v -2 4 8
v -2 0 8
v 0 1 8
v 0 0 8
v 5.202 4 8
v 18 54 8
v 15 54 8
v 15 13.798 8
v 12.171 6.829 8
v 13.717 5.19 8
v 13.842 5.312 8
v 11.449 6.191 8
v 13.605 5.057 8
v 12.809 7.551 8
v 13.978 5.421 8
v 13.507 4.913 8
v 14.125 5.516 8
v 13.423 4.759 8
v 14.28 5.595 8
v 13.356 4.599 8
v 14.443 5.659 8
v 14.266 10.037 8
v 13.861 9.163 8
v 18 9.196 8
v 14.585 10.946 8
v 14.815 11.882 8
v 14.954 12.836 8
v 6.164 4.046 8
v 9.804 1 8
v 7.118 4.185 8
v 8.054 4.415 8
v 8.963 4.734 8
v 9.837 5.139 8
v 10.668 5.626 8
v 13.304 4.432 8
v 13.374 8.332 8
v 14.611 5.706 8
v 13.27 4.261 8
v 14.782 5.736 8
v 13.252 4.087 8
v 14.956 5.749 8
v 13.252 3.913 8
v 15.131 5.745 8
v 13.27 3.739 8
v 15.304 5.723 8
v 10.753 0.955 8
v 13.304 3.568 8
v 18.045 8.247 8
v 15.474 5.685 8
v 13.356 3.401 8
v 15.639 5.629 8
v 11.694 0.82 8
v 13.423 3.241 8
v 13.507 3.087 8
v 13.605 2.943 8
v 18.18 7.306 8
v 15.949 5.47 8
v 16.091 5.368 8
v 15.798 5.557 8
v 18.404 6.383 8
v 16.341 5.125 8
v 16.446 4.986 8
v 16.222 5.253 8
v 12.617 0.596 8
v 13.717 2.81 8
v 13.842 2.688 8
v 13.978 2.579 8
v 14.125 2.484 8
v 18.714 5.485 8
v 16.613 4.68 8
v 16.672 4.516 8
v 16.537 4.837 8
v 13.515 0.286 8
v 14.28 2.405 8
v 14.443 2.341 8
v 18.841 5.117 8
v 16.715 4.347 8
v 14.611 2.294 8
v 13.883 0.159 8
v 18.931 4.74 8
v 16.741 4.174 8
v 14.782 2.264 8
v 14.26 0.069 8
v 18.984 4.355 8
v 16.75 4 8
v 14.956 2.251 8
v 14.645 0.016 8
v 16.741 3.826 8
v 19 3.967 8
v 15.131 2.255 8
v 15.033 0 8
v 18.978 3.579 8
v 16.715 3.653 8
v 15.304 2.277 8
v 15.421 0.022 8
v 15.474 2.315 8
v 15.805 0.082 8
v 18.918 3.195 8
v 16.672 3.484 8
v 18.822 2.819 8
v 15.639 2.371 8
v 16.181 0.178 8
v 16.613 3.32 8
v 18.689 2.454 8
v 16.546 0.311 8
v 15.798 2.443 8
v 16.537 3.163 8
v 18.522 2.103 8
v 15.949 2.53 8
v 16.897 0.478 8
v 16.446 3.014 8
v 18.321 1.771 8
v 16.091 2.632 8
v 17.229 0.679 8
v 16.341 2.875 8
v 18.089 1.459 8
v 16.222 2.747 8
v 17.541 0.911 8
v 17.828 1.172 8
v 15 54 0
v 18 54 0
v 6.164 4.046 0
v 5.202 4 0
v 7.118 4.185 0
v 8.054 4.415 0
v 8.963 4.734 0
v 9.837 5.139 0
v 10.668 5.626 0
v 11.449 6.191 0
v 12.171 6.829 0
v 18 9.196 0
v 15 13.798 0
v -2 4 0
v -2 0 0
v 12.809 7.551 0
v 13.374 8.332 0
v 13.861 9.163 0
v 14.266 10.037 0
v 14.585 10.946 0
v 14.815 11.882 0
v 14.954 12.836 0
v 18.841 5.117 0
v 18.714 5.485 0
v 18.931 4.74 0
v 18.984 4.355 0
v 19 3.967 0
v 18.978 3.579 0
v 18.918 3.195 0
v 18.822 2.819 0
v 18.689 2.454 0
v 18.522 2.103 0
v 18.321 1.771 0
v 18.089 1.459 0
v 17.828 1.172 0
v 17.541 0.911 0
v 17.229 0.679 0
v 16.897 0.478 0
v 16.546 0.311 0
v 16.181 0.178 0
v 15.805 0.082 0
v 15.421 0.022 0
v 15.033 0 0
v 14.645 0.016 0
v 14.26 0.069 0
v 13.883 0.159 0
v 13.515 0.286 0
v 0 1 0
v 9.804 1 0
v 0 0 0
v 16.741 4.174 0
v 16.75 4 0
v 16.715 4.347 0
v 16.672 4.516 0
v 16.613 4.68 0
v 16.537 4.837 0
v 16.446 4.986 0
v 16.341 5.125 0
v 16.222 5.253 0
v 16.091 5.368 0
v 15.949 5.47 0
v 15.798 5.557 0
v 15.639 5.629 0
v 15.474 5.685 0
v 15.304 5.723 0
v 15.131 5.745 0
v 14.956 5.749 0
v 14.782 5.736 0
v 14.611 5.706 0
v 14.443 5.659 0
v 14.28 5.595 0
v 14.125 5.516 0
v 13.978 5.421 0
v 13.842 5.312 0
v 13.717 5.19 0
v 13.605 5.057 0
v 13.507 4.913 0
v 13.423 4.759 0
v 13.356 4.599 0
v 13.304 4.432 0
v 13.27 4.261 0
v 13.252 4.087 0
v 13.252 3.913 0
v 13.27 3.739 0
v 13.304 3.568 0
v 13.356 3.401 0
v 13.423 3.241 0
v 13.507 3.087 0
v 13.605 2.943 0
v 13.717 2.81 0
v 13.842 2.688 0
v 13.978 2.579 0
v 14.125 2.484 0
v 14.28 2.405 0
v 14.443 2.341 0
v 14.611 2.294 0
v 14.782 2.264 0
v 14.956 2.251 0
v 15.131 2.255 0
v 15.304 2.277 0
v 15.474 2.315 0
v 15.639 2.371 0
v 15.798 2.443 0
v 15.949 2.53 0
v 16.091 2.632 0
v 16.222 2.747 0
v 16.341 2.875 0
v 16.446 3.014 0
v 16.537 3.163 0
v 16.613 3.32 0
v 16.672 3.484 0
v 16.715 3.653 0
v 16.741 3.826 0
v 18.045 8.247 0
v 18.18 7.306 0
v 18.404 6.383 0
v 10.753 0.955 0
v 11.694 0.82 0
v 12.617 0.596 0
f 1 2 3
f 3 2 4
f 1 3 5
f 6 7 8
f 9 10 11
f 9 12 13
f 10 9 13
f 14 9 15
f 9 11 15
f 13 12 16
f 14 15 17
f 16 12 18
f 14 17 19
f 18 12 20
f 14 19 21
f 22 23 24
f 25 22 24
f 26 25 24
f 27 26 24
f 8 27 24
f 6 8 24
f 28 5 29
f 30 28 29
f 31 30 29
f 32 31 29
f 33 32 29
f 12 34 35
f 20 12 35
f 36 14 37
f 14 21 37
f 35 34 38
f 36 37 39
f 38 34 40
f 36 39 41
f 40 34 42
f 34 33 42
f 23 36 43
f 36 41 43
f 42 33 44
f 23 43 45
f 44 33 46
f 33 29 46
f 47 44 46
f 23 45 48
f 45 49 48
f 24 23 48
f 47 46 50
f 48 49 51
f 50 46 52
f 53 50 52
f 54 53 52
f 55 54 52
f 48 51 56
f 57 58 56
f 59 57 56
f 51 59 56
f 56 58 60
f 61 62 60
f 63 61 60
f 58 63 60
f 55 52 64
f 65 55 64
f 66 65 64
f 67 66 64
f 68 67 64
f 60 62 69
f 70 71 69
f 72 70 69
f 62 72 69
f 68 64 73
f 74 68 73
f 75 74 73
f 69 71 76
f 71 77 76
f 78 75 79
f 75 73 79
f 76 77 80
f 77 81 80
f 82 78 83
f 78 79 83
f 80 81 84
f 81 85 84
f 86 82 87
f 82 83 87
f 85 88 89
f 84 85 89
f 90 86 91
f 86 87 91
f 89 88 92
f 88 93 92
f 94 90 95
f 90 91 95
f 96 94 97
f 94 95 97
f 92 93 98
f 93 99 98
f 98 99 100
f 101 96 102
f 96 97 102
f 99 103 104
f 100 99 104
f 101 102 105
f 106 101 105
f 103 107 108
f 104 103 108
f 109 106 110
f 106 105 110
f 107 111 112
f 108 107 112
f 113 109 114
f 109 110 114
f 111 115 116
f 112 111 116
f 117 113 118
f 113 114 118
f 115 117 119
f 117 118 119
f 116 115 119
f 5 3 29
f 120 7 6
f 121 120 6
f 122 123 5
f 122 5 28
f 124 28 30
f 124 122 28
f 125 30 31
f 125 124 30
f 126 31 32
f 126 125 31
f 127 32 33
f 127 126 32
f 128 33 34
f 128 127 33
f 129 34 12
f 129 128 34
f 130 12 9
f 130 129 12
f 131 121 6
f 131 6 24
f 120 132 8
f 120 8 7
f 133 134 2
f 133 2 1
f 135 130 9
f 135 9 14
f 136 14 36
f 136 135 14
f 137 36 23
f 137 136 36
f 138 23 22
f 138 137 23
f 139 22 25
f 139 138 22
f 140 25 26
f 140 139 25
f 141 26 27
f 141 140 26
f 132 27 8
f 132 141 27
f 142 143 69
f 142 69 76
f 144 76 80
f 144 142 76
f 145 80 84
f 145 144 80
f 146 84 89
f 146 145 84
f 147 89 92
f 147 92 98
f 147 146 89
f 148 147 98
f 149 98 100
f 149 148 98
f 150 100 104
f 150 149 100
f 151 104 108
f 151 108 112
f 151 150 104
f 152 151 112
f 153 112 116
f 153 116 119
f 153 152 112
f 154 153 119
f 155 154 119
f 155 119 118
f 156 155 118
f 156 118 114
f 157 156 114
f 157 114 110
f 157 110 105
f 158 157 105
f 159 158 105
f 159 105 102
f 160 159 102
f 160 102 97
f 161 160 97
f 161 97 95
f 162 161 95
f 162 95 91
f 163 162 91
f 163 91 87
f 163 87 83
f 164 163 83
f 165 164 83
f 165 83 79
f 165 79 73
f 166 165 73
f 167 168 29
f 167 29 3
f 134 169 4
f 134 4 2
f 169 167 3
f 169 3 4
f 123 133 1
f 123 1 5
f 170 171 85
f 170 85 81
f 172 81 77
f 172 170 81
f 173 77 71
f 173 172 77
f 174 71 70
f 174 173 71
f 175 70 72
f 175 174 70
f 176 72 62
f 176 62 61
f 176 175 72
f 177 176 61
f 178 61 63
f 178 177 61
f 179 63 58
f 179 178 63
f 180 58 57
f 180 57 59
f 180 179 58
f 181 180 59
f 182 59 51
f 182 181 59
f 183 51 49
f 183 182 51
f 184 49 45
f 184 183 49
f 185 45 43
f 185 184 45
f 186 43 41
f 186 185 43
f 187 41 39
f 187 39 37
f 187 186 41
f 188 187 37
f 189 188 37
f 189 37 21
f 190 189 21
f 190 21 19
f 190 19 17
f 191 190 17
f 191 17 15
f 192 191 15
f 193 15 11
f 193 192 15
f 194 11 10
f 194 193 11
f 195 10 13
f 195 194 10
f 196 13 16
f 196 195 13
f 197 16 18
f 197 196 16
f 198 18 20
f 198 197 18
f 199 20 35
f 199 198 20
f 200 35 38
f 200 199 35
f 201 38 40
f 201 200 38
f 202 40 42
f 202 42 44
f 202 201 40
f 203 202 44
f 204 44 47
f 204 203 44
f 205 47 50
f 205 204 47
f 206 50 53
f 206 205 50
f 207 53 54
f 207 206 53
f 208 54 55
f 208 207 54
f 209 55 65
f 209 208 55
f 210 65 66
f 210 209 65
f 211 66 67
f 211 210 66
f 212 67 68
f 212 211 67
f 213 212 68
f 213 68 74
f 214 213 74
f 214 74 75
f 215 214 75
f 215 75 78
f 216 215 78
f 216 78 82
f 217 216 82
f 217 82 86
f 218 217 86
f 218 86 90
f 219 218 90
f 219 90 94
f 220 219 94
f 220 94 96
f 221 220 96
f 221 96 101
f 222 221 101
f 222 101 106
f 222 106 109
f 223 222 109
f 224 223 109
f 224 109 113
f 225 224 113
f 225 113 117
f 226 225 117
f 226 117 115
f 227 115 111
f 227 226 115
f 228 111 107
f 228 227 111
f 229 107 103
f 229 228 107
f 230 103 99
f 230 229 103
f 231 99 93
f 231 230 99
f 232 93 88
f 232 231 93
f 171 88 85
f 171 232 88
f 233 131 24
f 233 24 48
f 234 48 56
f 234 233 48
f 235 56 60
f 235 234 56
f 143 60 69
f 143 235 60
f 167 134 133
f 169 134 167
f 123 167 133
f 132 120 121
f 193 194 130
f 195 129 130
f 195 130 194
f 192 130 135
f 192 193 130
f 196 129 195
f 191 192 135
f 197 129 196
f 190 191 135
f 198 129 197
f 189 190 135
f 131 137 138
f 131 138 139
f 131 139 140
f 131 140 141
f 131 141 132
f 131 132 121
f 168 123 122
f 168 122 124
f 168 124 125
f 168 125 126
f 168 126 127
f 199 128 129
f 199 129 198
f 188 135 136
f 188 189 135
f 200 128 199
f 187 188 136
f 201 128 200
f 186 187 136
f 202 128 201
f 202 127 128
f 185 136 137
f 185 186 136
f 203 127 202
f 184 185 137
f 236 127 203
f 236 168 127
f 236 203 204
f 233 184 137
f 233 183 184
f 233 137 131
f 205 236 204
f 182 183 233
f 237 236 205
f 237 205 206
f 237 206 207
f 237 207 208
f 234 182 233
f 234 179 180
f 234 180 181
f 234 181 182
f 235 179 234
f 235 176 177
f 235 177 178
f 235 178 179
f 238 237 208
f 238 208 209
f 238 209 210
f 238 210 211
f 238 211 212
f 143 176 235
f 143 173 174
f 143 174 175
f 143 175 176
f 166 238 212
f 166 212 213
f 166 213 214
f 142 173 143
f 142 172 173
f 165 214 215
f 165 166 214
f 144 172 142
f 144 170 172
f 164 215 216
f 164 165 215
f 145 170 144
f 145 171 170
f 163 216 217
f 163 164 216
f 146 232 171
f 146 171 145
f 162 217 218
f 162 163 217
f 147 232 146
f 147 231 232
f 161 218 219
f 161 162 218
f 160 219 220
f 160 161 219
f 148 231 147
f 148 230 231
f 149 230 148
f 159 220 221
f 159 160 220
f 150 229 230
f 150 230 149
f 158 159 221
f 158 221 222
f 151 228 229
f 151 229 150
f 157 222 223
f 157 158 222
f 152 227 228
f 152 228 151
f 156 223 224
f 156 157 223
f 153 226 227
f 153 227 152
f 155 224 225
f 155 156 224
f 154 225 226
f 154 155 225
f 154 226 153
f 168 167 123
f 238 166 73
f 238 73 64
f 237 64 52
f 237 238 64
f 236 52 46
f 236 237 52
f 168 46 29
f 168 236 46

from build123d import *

# Parameters (mm, degrees)
SKETCH1_R           = 1.75
BOSS_EXTRUDE1_DEPTH = 8
FILLET1_R           = 10


with BuildPart() as part:
    # Sketch1 → Boss-Extrude1 (new body)
    with BuildSketch(Plane.XY):
        with BuildLine():
            Line((0, 0), (-2, 0))
            Line((-2, 0), (-2, 4))
            Line((-2, 4), (11, 4))
            ThreePointArc((11, 4), (12.171572875, 6.828427125), (15, 8))
            Line((15, 8), (15, 54))
            Line((15, 54), (18, 54))
            Line((18, 54), (18, 6.645751311))
            ThreePointArc((18, 6.645751311), (17.828427125, 1.171572875), (12.354248689, 1))
            Line((12.354248689, 1), (0, 1))
            Line((0, 1), (0, 0))
        make_face()
        with Locations((15, 4)):
            Circle(SKETCH1_R, mode=Mode.SUBTRACT)
    extrude(amount=BOSS_EXTRUDE1_DEPTH)

    # Fillet1
    # the kernel refuses this fillet: 10 mm, written as the material it adds along each edge
    with BuildSketch(Plane(origin=(11, 4, 0), x_dir=(-1, 0, 0), z_dir=(0, 0, 1))) as fillet1_piece_1:
        with BuildLine():
            CenterArc((5.797958971, -10), FILLET1_R, 90, 44.415308597)
            ThreePointArc((-1.200583151, -2.857142857), (-0.31234035, -1.549569715), (0, 0))
            Line((0, 0), (5.797958971, 0))
        make_face()
    extrude(amount=8)
    with BuildSketch(Plane(origin=(15, 8, 0), x_dir=(-0.9219149126204016, -0.3873924287955524, 0), z_dir=(0, 0, 1))) as fillet1_piece_2:
        with BuildLine():
            CenterArc((6.973063718, -9.219149126), FILLET1_R, 112.792345701, 44.415308597)
            Line((-2.246085408, -5.345224838), (0, 0))
            ThreePointArc((0, 0), (1.549569715, -0.31234035), (3.09913943, 0))
        make_face()
    extrude(amount=8)
    with BuildSketch(Plane(origin=(18, 6.645751311, 0), x_dir=(0, 1, 0), z_dir=(0, 0, 1))) as fillet1_piece_3:
        with BuildLine():
            CenterArc((2.550401112, -10), FILLET1_R, 90, 21.786789298)
            ThreePointArc((-1.161136333, -0.714285714), (-0.54991438, -0.406973372), (0, 0))
            Line((0, 0), (2.550401112, 0))
        make_face()
    extrude(amount=8)
    with BuildSketch(Plane(origin=(12.354248689, 1, 0), x_dir=(-1, 0, 0), z_dir=(0, 0, 1))) as fillet1_piece_4:
        with BuildLine():
            CenterArc((2.550401112, 10), FILLET1_R, 248.213210702, 21.786789298)
            ThreePointArc((-1.161136333, 0.714285714), (-0.54991438, 0.406973372), (0, 0))
            Line((0, 0), (2.550401112, 0))
        make_face()
    extrude(amount=8)


solid = part.part
